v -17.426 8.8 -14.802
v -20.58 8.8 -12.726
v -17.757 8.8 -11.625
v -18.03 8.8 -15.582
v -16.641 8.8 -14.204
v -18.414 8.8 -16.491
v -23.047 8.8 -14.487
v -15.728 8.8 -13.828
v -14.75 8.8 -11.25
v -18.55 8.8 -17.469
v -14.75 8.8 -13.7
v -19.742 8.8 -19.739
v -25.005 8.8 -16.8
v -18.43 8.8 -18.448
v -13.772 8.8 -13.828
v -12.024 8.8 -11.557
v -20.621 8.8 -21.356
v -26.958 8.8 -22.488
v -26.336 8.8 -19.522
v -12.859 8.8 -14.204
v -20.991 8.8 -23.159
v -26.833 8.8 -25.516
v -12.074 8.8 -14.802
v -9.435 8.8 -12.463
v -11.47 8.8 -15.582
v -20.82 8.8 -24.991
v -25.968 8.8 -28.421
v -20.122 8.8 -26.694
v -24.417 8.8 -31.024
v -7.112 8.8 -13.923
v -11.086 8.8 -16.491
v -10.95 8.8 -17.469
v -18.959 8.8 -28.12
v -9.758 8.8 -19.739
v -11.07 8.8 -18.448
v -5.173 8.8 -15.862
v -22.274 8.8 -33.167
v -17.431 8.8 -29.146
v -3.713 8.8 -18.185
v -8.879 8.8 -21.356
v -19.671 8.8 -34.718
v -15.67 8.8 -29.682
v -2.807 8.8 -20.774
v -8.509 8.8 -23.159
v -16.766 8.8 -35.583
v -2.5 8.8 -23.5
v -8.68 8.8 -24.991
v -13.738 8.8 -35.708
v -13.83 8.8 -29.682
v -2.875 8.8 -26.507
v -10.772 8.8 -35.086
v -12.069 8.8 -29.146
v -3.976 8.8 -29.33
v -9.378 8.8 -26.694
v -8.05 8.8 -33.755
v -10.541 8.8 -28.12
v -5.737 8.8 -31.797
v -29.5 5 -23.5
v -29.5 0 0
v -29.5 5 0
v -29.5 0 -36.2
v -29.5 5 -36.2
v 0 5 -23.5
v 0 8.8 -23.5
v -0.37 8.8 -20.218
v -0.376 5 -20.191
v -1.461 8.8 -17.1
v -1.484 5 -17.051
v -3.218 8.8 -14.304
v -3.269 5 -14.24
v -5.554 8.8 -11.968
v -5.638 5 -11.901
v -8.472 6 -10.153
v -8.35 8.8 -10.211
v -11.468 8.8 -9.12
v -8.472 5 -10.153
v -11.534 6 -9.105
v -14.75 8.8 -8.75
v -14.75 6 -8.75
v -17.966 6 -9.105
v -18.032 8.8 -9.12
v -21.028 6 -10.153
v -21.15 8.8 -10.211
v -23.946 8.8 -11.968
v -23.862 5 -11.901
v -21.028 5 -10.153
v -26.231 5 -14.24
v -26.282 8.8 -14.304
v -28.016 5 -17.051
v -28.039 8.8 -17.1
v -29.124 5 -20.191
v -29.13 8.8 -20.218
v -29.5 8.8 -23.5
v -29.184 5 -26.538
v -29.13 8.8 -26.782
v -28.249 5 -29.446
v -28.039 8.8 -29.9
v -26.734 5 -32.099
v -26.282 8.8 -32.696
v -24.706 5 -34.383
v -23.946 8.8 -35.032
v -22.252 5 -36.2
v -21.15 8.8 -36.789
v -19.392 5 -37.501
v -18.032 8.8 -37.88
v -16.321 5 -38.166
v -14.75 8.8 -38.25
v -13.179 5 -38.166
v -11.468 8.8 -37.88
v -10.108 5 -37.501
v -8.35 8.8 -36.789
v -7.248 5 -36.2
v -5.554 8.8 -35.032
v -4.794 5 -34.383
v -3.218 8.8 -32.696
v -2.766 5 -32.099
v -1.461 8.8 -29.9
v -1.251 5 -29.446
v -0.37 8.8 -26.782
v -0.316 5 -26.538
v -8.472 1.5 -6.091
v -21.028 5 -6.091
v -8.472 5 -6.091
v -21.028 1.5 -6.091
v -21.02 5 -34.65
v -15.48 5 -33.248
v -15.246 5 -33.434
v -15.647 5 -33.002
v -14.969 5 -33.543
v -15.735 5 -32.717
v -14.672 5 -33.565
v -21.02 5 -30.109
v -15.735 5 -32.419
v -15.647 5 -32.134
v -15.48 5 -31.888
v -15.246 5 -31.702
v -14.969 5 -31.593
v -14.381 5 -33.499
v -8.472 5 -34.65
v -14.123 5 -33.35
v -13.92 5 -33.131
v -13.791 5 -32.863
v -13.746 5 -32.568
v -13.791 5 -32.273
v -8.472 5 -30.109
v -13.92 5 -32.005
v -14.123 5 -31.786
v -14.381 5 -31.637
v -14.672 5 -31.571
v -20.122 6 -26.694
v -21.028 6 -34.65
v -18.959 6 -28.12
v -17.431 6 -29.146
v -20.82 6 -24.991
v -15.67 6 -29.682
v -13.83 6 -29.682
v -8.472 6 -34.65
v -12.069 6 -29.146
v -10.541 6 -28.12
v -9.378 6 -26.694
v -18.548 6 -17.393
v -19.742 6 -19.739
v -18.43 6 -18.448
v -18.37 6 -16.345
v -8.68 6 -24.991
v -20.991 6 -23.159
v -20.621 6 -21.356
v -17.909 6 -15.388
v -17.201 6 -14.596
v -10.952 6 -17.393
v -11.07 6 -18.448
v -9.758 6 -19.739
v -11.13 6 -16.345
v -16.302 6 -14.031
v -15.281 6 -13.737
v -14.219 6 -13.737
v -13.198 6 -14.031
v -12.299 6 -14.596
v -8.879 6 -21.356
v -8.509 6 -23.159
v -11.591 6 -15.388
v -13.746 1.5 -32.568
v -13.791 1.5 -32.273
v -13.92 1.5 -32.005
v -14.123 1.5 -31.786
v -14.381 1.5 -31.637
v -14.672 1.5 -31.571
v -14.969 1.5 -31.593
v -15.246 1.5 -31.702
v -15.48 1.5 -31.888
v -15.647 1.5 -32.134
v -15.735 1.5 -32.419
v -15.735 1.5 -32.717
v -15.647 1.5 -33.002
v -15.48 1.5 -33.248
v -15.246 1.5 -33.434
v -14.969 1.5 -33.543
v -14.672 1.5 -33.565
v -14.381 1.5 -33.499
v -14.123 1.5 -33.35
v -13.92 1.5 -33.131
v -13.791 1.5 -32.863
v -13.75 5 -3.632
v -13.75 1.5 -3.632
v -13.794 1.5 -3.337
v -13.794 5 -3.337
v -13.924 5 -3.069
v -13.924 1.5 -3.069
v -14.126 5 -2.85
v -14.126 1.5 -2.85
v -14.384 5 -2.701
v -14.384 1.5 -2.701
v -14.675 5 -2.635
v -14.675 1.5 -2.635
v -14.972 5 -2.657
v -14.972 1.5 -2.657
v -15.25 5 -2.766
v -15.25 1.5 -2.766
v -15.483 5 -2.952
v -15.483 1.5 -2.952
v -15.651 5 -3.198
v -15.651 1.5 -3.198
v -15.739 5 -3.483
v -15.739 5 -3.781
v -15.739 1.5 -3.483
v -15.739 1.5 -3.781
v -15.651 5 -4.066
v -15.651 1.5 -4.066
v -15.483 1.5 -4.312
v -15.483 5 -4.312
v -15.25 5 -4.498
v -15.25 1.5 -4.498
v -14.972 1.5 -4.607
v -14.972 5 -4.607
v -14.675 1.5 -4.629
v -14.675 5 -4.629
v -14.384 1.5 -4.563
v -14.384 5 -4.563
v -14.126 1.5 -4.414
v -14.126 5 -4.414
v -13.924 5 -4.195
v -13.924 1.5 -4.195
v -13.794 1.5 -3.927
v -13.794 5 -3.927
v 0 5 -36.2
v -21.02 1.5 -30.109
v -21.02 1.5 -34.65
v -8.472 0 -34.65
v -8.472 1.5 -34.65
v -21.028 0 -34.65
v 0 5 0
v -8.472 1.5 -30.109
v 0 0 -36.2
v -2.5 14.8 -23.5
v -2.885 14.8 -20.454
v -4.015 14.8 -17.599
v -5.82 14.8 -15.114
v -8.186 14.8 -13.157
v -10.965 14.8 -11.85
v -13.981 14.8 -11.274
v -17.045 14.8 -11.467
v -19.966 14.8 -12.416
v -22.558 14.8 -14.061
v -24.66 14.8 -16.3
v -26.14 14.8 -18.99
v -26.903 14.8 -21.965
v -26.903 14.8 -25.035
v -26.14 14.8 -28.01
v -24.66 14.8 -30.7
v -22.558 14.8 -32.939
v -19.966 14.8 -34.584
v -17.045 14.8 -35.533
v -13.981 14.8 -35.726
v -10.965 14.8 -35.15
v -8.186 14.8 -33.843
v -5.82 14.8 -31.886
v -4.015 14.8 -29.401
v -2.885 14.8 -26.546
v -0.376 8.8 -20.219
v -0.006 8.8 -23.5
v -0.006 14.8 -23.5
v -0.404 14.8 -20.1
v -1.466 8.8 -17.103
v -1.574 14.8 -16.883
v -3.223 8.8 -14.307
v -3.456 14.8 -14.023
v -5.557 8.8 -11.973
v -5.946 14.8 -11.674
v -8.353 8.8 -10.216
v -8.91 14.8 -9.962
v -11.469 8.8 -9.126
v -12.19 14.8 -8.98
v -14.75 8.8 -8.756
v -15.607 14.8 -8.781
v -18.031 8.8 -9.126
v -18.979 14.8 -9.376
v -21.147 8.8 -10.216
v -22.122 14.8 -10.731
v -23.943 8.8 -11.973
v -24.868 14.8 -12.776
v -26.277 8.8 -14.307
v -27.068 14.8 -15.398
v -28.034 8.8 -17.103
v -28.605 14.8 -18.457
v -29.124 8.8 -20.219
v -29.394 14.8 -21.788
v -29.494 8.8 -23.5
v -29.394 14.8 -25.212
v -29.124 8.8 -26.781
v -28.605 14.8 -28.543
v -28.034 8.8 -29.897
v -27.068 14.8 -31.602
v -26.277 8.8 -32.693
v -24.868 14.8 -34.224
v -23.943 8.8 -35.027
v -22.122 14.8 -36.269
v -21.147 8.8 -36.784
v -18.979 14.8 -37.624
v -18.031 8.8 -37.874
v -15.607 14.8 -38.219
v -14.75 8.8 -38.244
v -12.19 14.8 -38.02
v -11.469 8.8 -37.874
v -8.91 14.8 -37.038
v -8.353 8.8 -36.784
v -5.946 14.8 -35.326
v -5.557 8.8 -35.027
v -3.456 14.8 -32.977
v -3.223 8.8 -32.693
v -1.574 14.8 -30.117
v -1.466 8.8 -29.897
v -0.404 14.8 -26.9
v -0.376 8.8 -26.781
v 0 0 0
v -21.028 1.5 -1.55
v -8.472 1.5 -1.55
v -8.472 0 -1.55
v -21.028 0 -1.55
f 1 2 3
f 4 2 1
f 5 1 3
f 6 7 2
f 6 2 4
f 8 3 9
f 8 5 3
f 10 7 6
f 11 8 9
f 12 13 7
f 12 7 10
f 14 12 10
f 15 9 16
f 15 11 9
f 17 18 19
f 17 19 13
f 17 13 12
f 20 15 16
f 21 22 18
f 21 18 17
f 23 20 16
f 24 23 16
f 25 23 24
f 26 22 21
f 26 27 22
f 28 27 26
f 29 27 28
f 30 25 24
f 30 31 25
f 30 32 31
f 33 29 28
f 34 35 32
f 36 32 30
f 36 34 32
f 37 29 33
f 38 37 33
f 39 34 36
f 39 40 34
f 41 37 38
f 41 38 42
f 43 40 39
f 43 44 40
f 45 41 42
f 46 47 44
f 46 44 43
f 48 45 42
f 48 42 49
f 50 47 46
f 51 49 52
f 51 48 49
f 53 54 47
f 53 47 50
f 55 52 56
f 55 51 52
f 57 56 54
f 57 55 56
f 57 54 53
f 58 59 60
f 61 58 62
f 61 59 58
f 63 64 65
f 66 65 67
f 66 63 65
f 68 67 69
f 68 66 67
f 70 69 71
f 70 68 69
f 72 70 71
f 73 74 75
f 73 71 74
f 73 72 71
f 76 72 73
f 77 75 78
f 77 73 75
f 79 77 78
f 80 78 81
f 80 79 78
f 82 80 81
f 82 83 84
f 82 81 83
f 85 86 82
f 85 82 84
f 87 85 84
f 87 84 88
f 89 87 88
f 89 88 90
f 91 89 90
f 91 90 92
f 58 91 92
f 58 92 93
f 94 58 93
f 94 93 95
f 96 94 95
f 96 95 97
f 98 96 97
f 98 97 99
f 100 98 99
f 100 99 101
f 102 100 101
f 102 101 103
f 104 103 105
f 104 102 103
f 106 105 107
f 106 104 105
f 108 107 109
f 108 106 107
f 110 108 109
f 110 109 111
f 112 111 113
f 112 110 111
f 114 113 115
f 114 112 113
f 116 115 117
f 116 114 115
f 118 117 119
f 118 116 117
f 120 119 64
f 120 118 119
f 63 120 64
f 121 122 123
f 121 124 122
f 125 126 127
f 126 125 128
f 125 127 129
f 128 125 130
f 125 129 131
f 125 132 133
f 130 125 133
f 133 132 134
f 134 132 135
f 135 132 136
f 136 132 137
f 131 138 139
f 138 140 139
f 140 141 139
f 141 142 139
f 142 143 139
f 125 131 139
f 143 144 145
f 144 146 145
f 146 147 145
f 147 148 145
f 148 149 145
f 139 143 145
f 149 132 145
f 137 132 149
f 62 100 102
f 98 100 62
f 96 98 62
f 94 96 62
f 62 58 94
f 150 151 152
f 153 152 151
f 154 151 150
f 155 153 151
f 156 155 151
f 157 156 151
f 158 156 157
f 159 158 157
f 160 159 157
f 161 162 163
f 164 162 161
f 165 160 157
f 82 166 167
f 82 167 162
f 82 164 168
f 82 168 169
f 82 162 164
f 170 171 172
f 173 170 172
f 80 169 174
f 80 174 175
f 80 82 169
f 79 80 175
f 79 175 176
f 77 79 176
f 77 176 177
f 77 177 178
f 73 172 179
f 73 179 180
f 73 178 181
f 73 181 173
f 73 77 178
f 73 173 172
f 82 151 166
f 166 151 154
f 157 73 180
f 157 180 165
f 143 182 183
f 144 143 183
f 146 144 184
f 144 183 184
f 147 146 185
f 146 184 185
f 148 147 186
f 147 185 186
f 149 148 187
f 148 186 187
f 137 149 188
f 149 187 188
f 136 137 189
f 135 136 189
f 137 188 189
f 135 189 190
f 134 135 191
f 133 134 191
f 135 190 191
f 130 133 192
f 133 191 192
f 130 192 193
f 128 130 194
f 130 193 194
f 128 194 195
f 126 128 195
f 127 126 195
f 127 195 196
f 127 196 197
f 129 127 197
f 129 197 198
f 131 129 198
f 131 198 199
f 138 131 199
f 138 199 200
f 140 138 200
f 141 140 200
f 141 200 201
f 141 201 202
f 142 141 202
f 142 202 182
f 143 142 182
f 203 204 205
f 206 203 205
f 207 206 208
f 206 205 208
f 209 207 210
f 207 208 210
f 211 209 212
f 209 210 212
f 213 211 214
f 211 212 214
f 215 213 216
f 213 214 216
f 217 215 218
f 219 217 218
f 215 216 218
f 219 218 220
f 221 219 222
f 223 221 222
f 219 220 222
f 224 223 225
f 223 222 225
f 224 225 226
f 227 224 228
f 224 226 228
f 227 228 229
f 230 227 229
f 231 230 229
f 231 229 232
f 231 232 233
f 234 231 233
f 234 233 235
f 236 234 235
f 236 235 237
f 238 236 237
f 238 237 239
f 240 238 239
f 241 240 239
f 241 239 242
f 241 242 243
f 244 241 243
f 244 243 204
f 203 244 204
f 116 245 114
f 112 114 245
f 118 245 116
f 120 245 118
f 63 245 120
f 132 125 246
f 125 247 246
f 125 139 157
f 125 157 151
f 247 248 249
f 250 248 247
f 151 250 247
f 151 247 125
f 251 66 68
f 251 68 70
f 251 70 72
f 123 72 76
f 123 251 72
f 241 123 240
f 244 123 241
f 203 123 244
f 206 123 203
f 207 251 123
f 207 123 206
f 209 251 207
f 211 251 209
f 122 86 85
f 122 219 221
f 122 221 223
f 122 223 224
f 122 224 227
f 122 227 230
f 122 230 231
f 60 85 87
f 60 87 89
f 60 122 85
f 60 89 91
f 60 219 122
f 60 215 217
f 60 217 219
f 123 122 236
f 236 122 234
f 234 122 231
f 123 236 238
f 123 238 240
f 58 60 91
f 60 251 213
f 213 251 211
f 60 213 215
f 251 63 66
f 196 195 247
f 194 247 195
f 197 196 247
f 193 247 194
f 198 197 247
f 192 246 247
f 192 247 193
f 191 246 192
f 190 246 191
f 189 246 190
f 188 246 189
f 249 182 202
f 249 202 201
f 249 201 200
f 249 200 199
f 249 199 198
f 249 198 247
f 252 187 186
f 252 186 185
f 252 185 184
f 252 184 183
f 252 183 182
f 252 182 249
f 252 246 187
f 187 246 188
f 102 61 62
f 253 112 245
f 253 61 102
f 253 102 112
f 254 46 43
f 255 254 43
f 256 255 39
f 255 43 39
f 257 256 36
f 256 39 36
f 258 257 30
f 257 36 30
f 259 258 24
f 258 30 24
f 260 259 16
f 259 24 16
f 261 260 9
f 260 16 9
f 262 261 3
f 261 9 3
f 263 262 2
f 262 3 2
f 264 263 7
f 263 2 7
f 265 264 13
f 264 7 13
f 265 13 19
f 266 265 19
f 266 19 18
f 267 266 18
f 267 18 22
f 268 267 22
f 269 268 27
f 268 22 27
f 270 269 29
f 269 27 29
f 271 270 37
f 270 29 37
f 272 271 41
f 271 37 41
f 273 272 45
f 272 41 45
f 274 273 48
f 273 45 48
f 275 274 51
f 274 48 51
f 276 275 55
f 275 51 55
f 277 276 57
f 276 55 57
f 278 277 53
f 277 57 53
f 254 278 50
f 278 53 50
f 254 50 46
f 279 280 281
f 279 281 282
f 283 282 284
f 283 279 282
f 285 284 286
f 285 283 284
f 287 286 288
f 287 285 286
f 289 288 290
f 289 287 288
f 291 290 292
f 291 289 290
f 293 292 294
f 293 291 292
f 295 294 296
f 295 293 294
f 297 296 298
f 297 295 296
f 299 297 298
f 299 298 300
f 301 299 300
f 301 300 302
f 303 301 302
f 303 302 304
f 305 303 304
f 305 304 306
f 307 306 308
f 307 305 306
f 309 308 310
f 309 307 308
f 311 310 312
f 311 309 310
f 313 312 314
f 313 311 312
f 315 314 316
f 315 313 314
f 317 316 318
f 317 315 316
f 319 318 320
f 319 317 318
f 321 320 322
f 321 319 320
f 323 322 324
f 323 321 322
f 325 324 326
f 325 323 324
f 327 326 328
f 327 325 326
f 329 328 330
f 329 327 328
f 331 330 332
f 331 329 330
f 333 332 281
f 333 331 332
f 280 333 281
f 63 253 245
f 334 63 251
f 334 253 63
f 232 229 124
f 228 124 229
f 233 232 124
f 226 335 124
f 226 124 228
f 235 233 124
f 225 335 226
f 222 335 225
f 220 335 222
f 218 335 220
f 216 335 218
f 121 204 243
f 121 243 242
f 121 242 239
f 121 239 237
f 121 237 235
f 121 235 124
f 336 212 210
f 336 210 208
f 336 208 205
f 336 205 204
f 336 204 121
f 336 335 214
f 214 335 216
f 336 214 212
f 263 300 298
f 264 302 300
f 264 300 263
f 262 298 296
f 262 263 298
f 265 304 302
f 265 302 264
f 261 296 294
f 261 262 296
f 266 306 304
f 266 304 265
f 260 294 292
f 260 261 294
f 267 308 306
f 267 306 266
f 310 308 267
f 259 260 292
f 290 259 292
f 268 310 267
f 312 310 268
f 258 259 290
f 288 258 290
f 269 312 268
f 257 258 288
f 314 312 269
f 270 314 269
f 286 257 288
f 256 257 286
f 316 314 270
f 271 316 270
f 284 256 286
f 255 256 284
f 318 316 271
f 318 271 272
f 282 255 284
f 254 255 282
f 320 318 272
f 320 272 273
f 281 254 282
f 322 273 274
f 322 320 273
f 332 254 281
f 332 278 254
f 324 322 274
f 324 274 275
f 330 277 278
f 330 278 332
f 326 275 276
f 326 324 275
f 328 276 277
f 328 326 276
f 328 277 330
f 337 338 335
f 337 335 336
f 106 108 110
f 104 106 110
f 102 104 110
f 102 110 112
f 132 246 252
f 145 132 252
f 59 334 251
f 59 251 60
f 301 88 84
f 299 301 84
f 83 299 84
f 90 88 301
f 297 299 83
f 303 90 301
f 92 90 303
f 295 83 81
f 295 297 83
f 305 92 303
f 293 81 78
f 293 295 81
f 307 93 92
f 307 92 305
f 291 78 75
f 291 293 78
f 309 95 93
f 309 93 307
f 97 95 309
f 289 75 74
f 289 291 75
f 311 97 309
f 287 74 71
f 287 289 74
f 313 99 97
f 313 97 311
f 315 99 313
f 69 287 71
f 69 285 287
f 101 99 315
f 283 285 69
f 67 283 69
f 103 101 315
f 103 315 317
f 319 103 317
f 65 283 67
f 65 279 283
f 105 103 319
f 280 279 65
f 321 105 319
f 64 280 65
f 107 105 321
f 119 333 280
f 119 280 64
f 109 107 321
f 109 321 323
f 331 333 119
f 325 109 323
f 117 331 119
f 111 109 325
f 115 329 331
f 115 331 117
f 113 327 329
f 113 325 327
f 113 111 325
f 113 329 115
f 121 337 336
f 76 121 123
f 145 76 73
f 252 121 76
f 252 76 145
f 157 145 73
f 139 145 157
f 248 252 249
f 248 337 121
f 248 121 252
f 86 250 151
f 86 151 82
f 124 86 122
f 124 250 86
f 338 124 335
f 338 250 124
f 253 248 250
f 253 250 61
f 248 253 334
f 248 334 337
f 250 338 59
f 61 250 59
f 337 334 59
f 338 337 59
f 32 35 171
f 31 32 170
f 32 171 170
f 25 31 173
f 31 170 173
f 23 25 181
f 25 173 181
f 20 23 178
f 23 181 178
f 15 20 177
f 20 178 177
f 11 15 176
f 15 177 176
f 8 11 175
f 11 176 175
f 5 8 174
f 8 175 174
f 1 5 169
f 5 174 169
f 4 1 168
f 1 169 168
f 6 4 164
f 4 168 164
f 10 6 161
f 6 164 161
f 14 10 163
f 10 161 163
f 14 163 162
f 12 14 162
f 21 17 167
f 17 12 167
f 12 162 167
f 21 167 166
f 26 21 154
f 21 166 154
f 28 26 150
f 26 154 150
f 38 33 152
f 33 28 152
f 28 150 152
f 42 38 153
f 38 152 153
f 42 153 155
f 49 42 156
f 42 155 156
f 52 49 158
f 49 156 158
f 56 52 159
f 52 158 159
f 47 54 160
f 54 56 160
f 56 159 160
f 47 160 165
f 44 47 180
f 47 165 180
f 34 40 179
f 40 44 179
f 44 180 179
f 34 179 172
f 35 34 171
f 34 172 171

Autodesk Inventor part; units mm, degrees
ref_plane "YZ Plane" through (0, 0, 0) normal (1, 0, 0) x (0, 1, 0)
ref_plane "XZ Plane" through (0, 0, 0) normal (0, 1, 0) x (-1, 0, 0)
sketch "Sketch1" plane through (0, 0, 0) normal (0, 1, 0) x (-1, 0, 0)
  line L0 (0, 0) -> (29.5, 0)
  line L1 (29.5, 0) -> (29.5, -36.2)
  line L2 (29.5, -36.2) -> (0, -36.2)
  line L3 (0, -36.2) -> (0, 0)
  dimension "d0" = 29.5
  dimension "d1" = 36.2
extrude "Extrusion1" add sketch "Sketch1" along normal blind 5
sketch "Sketch2" plane through (0, 5, 0) normal (0, 1, 0) x (1, 0, 0)
  line L0 (-29.5, 0) -> (0, 0) projected
  line L1 (-14.75, 0) -> (-14.75, 17.5)
  arc A0 (-18.4298, 18.4481) -> (-11.0702, 18.4481) centre (-14.75, 17.5) ccw
  line L2 (-14.75, 17.5) -> (-14.75, 23.5)
  arc A1 (-11.0702, 18.4481) -> (-18.4298, 18.4481) centre (-14.75, 23.5) ccw
  circle A2 centre (-14.75, 23.5) radius 12.175
  circle A3 centre (-14.75, 23.5) radius 14.75
  dimension "d4" = 17.5
  dimension "d5" = 7.6
  dimension "d6" = 6
  dimension "d7" = 12.5
  dimension "d8" = 24.35
  dimension "d9" = 29.5
extrude "Extrusion2" add sketch "Sketch2" along normal blind 3.8 contours A2 | A3
sketch "Sketch4" plane through (-14.75, 8.8, -23.5) normal (0, 1, 0) x (1, 0, 0)
  circle A0 centre (0, 0) radius 12.25
  circle A1 centre (0, 0) radius 14.7438
  point P0 (14.75, -23.5)
  dimension "d12" = 24.5
extrude "Extrusion3" add sketch "Sketch4" along normal blind 6
sketch "Sketch5" plane through (-14.75, 8.8, -23.5) normal (0, 1, 0) x (1, 0, 0)
  arc A0 (-3.6798, -5.0519) -> (3.6798, -5.0519) centre (0, -6) ccw projected
  arc A1 (3.6798, -5.0519) -> (-3.6798, -5.0519) centre (0, 0) ccw projected
  point P0 (14.75, -23.5)
extrude "Extrusion4" cut sketch "Sketch5" against normal up to surface (8.8 mm away)
sketch "Sketch6" plane through (0, 0, 0) normal (0, -1, 0) x (1, 0, 0)
  arc A0 (-11.0702, -18.4481) -> (-18.4298, -18.4481) centre (-14.75, -17.5) ccw projected
  arc A1 (-18.4298, -18.4481) -> (-11.0702, -18.4481) centre (-14.75, -23.5) ccw projected
  line L0 (0, 0) -> (-29.5, 0) projected
  line L1 (-29.5, 0) -> (-29.5, -36.2) projected
  line L2 (-29.5, -36.2) -> (0, -36.2) projected
  line L3 (0, -36.2) -> (0, 0) projected
  line L4 (-14.75, 0) -> (-14.75, -36.2)
  line L5 (0, -36.2) -> (0, 0) projected
  line L6 (0, -18.1) -> (-29.5, -18.1)
  line L7 (-21.0275, -1.55) -> (-8.4725, -1.55)
  line L8 (-8.4725, -1.55) -> (-8.4725, -34.65)
  line L9 (-8.4725, -34.65) -> (-21.0275, -34.65)
  line L10 (-21.0275, -34.65) -> (-21.0275, -1.55)
  line L11 (-21.0275, -1.55) -> (-8.4725, -34.65) construction
  line L12 (-8.4725, -1.55) -> (-21.0275, -34.65) construction
  point P0 (-14.75, -18.1)
  dimension "d17" = 12.555
  dimension "d18" = 33.1
extrude "Extrusion5" cut sketch "Sketch6" against normal blind 6 contours A0 L6 L8 L9 L4 A1 | A0 L4 L7 L8 L6 | L4 L9 L10 L6 A0 A1 | A0 L6 L10 L7 L4
ref_plane "Work Plane1" through (0, 1.5, 0) normal (0, -1, 0) x (1, 0, 0)
sketch "Sketch7" plane through (0, 1.5, 0) normal (0, -1, 0) x (1, 0, 0)
  line L0 (-8.4725, -1.55) -> (-8.4725, -34.65) projected
  line L1 (-8.4725, -34.65) -> (-21.0275, -34.65) projected
  line L2 (-21.0275, -1.55) -> (-8.4725, -1.55) projected
  line L3 (-21.0275, -34.65) -> (-21.0275, -1.55) projected
  line L4 (-8.4725, -1.55) -> (-21.0275, -1.55)
  line L5 (-21.0275, -1.55) -> (-21.0275, -6.091)
  line L6 (-21.0275, -6.091) -> (-8.4725, -6.091)
  line L7 (-8.4725, -6.091) -> (-8.4725, -1.55)
  line L8 (-8.4725, -34.65) -> (-21.0201, -34.65)
  line L9 (-21.0201, -34.65) -> (-21.0201, -30.109)
  line L10 (-21.0201, -30.109) -> (-8.4725, -30.109)
  line L11 (-8.4725, -30.109) -> (-8.4725, -34.65)
  line L12 (-14.75, -1.55) -> (-14.7463, -34.65)
  line L13 (-14.75, -1.55) -> (-14.7498, -3.632)
  line L14 (-14.7463, -34.65) -> (-14.7465, -32.568)
  circle A0 centre (-14.7498, -3.632) radius 1
  circle A1 centre (-14.7465, -32.568) radius 1
  point P0 (0, 0)
  dimension "d22" = 4.541
  dimension "d23" = 12.555
  dimension "d24" = 4.541
  dimension "d25" = 12.5476
  dimension "d26" = 2.082
  dimension "d27" = 0
  dimension "d28" = 2.082
  dimension "d29" = 0
  dimension "d30" = 2
  dimension "d31" = 2
extrude "Extrusion6" add sketch "Sketch7" against normal up to surface (3.5 mm away) contours L0 L6 L12 A0 L2 | L12 A0 L6 L3 L2 | L0 L1 L12 A1 L10 | L12 A1 L1 L9 L10
properties part number "middle"
